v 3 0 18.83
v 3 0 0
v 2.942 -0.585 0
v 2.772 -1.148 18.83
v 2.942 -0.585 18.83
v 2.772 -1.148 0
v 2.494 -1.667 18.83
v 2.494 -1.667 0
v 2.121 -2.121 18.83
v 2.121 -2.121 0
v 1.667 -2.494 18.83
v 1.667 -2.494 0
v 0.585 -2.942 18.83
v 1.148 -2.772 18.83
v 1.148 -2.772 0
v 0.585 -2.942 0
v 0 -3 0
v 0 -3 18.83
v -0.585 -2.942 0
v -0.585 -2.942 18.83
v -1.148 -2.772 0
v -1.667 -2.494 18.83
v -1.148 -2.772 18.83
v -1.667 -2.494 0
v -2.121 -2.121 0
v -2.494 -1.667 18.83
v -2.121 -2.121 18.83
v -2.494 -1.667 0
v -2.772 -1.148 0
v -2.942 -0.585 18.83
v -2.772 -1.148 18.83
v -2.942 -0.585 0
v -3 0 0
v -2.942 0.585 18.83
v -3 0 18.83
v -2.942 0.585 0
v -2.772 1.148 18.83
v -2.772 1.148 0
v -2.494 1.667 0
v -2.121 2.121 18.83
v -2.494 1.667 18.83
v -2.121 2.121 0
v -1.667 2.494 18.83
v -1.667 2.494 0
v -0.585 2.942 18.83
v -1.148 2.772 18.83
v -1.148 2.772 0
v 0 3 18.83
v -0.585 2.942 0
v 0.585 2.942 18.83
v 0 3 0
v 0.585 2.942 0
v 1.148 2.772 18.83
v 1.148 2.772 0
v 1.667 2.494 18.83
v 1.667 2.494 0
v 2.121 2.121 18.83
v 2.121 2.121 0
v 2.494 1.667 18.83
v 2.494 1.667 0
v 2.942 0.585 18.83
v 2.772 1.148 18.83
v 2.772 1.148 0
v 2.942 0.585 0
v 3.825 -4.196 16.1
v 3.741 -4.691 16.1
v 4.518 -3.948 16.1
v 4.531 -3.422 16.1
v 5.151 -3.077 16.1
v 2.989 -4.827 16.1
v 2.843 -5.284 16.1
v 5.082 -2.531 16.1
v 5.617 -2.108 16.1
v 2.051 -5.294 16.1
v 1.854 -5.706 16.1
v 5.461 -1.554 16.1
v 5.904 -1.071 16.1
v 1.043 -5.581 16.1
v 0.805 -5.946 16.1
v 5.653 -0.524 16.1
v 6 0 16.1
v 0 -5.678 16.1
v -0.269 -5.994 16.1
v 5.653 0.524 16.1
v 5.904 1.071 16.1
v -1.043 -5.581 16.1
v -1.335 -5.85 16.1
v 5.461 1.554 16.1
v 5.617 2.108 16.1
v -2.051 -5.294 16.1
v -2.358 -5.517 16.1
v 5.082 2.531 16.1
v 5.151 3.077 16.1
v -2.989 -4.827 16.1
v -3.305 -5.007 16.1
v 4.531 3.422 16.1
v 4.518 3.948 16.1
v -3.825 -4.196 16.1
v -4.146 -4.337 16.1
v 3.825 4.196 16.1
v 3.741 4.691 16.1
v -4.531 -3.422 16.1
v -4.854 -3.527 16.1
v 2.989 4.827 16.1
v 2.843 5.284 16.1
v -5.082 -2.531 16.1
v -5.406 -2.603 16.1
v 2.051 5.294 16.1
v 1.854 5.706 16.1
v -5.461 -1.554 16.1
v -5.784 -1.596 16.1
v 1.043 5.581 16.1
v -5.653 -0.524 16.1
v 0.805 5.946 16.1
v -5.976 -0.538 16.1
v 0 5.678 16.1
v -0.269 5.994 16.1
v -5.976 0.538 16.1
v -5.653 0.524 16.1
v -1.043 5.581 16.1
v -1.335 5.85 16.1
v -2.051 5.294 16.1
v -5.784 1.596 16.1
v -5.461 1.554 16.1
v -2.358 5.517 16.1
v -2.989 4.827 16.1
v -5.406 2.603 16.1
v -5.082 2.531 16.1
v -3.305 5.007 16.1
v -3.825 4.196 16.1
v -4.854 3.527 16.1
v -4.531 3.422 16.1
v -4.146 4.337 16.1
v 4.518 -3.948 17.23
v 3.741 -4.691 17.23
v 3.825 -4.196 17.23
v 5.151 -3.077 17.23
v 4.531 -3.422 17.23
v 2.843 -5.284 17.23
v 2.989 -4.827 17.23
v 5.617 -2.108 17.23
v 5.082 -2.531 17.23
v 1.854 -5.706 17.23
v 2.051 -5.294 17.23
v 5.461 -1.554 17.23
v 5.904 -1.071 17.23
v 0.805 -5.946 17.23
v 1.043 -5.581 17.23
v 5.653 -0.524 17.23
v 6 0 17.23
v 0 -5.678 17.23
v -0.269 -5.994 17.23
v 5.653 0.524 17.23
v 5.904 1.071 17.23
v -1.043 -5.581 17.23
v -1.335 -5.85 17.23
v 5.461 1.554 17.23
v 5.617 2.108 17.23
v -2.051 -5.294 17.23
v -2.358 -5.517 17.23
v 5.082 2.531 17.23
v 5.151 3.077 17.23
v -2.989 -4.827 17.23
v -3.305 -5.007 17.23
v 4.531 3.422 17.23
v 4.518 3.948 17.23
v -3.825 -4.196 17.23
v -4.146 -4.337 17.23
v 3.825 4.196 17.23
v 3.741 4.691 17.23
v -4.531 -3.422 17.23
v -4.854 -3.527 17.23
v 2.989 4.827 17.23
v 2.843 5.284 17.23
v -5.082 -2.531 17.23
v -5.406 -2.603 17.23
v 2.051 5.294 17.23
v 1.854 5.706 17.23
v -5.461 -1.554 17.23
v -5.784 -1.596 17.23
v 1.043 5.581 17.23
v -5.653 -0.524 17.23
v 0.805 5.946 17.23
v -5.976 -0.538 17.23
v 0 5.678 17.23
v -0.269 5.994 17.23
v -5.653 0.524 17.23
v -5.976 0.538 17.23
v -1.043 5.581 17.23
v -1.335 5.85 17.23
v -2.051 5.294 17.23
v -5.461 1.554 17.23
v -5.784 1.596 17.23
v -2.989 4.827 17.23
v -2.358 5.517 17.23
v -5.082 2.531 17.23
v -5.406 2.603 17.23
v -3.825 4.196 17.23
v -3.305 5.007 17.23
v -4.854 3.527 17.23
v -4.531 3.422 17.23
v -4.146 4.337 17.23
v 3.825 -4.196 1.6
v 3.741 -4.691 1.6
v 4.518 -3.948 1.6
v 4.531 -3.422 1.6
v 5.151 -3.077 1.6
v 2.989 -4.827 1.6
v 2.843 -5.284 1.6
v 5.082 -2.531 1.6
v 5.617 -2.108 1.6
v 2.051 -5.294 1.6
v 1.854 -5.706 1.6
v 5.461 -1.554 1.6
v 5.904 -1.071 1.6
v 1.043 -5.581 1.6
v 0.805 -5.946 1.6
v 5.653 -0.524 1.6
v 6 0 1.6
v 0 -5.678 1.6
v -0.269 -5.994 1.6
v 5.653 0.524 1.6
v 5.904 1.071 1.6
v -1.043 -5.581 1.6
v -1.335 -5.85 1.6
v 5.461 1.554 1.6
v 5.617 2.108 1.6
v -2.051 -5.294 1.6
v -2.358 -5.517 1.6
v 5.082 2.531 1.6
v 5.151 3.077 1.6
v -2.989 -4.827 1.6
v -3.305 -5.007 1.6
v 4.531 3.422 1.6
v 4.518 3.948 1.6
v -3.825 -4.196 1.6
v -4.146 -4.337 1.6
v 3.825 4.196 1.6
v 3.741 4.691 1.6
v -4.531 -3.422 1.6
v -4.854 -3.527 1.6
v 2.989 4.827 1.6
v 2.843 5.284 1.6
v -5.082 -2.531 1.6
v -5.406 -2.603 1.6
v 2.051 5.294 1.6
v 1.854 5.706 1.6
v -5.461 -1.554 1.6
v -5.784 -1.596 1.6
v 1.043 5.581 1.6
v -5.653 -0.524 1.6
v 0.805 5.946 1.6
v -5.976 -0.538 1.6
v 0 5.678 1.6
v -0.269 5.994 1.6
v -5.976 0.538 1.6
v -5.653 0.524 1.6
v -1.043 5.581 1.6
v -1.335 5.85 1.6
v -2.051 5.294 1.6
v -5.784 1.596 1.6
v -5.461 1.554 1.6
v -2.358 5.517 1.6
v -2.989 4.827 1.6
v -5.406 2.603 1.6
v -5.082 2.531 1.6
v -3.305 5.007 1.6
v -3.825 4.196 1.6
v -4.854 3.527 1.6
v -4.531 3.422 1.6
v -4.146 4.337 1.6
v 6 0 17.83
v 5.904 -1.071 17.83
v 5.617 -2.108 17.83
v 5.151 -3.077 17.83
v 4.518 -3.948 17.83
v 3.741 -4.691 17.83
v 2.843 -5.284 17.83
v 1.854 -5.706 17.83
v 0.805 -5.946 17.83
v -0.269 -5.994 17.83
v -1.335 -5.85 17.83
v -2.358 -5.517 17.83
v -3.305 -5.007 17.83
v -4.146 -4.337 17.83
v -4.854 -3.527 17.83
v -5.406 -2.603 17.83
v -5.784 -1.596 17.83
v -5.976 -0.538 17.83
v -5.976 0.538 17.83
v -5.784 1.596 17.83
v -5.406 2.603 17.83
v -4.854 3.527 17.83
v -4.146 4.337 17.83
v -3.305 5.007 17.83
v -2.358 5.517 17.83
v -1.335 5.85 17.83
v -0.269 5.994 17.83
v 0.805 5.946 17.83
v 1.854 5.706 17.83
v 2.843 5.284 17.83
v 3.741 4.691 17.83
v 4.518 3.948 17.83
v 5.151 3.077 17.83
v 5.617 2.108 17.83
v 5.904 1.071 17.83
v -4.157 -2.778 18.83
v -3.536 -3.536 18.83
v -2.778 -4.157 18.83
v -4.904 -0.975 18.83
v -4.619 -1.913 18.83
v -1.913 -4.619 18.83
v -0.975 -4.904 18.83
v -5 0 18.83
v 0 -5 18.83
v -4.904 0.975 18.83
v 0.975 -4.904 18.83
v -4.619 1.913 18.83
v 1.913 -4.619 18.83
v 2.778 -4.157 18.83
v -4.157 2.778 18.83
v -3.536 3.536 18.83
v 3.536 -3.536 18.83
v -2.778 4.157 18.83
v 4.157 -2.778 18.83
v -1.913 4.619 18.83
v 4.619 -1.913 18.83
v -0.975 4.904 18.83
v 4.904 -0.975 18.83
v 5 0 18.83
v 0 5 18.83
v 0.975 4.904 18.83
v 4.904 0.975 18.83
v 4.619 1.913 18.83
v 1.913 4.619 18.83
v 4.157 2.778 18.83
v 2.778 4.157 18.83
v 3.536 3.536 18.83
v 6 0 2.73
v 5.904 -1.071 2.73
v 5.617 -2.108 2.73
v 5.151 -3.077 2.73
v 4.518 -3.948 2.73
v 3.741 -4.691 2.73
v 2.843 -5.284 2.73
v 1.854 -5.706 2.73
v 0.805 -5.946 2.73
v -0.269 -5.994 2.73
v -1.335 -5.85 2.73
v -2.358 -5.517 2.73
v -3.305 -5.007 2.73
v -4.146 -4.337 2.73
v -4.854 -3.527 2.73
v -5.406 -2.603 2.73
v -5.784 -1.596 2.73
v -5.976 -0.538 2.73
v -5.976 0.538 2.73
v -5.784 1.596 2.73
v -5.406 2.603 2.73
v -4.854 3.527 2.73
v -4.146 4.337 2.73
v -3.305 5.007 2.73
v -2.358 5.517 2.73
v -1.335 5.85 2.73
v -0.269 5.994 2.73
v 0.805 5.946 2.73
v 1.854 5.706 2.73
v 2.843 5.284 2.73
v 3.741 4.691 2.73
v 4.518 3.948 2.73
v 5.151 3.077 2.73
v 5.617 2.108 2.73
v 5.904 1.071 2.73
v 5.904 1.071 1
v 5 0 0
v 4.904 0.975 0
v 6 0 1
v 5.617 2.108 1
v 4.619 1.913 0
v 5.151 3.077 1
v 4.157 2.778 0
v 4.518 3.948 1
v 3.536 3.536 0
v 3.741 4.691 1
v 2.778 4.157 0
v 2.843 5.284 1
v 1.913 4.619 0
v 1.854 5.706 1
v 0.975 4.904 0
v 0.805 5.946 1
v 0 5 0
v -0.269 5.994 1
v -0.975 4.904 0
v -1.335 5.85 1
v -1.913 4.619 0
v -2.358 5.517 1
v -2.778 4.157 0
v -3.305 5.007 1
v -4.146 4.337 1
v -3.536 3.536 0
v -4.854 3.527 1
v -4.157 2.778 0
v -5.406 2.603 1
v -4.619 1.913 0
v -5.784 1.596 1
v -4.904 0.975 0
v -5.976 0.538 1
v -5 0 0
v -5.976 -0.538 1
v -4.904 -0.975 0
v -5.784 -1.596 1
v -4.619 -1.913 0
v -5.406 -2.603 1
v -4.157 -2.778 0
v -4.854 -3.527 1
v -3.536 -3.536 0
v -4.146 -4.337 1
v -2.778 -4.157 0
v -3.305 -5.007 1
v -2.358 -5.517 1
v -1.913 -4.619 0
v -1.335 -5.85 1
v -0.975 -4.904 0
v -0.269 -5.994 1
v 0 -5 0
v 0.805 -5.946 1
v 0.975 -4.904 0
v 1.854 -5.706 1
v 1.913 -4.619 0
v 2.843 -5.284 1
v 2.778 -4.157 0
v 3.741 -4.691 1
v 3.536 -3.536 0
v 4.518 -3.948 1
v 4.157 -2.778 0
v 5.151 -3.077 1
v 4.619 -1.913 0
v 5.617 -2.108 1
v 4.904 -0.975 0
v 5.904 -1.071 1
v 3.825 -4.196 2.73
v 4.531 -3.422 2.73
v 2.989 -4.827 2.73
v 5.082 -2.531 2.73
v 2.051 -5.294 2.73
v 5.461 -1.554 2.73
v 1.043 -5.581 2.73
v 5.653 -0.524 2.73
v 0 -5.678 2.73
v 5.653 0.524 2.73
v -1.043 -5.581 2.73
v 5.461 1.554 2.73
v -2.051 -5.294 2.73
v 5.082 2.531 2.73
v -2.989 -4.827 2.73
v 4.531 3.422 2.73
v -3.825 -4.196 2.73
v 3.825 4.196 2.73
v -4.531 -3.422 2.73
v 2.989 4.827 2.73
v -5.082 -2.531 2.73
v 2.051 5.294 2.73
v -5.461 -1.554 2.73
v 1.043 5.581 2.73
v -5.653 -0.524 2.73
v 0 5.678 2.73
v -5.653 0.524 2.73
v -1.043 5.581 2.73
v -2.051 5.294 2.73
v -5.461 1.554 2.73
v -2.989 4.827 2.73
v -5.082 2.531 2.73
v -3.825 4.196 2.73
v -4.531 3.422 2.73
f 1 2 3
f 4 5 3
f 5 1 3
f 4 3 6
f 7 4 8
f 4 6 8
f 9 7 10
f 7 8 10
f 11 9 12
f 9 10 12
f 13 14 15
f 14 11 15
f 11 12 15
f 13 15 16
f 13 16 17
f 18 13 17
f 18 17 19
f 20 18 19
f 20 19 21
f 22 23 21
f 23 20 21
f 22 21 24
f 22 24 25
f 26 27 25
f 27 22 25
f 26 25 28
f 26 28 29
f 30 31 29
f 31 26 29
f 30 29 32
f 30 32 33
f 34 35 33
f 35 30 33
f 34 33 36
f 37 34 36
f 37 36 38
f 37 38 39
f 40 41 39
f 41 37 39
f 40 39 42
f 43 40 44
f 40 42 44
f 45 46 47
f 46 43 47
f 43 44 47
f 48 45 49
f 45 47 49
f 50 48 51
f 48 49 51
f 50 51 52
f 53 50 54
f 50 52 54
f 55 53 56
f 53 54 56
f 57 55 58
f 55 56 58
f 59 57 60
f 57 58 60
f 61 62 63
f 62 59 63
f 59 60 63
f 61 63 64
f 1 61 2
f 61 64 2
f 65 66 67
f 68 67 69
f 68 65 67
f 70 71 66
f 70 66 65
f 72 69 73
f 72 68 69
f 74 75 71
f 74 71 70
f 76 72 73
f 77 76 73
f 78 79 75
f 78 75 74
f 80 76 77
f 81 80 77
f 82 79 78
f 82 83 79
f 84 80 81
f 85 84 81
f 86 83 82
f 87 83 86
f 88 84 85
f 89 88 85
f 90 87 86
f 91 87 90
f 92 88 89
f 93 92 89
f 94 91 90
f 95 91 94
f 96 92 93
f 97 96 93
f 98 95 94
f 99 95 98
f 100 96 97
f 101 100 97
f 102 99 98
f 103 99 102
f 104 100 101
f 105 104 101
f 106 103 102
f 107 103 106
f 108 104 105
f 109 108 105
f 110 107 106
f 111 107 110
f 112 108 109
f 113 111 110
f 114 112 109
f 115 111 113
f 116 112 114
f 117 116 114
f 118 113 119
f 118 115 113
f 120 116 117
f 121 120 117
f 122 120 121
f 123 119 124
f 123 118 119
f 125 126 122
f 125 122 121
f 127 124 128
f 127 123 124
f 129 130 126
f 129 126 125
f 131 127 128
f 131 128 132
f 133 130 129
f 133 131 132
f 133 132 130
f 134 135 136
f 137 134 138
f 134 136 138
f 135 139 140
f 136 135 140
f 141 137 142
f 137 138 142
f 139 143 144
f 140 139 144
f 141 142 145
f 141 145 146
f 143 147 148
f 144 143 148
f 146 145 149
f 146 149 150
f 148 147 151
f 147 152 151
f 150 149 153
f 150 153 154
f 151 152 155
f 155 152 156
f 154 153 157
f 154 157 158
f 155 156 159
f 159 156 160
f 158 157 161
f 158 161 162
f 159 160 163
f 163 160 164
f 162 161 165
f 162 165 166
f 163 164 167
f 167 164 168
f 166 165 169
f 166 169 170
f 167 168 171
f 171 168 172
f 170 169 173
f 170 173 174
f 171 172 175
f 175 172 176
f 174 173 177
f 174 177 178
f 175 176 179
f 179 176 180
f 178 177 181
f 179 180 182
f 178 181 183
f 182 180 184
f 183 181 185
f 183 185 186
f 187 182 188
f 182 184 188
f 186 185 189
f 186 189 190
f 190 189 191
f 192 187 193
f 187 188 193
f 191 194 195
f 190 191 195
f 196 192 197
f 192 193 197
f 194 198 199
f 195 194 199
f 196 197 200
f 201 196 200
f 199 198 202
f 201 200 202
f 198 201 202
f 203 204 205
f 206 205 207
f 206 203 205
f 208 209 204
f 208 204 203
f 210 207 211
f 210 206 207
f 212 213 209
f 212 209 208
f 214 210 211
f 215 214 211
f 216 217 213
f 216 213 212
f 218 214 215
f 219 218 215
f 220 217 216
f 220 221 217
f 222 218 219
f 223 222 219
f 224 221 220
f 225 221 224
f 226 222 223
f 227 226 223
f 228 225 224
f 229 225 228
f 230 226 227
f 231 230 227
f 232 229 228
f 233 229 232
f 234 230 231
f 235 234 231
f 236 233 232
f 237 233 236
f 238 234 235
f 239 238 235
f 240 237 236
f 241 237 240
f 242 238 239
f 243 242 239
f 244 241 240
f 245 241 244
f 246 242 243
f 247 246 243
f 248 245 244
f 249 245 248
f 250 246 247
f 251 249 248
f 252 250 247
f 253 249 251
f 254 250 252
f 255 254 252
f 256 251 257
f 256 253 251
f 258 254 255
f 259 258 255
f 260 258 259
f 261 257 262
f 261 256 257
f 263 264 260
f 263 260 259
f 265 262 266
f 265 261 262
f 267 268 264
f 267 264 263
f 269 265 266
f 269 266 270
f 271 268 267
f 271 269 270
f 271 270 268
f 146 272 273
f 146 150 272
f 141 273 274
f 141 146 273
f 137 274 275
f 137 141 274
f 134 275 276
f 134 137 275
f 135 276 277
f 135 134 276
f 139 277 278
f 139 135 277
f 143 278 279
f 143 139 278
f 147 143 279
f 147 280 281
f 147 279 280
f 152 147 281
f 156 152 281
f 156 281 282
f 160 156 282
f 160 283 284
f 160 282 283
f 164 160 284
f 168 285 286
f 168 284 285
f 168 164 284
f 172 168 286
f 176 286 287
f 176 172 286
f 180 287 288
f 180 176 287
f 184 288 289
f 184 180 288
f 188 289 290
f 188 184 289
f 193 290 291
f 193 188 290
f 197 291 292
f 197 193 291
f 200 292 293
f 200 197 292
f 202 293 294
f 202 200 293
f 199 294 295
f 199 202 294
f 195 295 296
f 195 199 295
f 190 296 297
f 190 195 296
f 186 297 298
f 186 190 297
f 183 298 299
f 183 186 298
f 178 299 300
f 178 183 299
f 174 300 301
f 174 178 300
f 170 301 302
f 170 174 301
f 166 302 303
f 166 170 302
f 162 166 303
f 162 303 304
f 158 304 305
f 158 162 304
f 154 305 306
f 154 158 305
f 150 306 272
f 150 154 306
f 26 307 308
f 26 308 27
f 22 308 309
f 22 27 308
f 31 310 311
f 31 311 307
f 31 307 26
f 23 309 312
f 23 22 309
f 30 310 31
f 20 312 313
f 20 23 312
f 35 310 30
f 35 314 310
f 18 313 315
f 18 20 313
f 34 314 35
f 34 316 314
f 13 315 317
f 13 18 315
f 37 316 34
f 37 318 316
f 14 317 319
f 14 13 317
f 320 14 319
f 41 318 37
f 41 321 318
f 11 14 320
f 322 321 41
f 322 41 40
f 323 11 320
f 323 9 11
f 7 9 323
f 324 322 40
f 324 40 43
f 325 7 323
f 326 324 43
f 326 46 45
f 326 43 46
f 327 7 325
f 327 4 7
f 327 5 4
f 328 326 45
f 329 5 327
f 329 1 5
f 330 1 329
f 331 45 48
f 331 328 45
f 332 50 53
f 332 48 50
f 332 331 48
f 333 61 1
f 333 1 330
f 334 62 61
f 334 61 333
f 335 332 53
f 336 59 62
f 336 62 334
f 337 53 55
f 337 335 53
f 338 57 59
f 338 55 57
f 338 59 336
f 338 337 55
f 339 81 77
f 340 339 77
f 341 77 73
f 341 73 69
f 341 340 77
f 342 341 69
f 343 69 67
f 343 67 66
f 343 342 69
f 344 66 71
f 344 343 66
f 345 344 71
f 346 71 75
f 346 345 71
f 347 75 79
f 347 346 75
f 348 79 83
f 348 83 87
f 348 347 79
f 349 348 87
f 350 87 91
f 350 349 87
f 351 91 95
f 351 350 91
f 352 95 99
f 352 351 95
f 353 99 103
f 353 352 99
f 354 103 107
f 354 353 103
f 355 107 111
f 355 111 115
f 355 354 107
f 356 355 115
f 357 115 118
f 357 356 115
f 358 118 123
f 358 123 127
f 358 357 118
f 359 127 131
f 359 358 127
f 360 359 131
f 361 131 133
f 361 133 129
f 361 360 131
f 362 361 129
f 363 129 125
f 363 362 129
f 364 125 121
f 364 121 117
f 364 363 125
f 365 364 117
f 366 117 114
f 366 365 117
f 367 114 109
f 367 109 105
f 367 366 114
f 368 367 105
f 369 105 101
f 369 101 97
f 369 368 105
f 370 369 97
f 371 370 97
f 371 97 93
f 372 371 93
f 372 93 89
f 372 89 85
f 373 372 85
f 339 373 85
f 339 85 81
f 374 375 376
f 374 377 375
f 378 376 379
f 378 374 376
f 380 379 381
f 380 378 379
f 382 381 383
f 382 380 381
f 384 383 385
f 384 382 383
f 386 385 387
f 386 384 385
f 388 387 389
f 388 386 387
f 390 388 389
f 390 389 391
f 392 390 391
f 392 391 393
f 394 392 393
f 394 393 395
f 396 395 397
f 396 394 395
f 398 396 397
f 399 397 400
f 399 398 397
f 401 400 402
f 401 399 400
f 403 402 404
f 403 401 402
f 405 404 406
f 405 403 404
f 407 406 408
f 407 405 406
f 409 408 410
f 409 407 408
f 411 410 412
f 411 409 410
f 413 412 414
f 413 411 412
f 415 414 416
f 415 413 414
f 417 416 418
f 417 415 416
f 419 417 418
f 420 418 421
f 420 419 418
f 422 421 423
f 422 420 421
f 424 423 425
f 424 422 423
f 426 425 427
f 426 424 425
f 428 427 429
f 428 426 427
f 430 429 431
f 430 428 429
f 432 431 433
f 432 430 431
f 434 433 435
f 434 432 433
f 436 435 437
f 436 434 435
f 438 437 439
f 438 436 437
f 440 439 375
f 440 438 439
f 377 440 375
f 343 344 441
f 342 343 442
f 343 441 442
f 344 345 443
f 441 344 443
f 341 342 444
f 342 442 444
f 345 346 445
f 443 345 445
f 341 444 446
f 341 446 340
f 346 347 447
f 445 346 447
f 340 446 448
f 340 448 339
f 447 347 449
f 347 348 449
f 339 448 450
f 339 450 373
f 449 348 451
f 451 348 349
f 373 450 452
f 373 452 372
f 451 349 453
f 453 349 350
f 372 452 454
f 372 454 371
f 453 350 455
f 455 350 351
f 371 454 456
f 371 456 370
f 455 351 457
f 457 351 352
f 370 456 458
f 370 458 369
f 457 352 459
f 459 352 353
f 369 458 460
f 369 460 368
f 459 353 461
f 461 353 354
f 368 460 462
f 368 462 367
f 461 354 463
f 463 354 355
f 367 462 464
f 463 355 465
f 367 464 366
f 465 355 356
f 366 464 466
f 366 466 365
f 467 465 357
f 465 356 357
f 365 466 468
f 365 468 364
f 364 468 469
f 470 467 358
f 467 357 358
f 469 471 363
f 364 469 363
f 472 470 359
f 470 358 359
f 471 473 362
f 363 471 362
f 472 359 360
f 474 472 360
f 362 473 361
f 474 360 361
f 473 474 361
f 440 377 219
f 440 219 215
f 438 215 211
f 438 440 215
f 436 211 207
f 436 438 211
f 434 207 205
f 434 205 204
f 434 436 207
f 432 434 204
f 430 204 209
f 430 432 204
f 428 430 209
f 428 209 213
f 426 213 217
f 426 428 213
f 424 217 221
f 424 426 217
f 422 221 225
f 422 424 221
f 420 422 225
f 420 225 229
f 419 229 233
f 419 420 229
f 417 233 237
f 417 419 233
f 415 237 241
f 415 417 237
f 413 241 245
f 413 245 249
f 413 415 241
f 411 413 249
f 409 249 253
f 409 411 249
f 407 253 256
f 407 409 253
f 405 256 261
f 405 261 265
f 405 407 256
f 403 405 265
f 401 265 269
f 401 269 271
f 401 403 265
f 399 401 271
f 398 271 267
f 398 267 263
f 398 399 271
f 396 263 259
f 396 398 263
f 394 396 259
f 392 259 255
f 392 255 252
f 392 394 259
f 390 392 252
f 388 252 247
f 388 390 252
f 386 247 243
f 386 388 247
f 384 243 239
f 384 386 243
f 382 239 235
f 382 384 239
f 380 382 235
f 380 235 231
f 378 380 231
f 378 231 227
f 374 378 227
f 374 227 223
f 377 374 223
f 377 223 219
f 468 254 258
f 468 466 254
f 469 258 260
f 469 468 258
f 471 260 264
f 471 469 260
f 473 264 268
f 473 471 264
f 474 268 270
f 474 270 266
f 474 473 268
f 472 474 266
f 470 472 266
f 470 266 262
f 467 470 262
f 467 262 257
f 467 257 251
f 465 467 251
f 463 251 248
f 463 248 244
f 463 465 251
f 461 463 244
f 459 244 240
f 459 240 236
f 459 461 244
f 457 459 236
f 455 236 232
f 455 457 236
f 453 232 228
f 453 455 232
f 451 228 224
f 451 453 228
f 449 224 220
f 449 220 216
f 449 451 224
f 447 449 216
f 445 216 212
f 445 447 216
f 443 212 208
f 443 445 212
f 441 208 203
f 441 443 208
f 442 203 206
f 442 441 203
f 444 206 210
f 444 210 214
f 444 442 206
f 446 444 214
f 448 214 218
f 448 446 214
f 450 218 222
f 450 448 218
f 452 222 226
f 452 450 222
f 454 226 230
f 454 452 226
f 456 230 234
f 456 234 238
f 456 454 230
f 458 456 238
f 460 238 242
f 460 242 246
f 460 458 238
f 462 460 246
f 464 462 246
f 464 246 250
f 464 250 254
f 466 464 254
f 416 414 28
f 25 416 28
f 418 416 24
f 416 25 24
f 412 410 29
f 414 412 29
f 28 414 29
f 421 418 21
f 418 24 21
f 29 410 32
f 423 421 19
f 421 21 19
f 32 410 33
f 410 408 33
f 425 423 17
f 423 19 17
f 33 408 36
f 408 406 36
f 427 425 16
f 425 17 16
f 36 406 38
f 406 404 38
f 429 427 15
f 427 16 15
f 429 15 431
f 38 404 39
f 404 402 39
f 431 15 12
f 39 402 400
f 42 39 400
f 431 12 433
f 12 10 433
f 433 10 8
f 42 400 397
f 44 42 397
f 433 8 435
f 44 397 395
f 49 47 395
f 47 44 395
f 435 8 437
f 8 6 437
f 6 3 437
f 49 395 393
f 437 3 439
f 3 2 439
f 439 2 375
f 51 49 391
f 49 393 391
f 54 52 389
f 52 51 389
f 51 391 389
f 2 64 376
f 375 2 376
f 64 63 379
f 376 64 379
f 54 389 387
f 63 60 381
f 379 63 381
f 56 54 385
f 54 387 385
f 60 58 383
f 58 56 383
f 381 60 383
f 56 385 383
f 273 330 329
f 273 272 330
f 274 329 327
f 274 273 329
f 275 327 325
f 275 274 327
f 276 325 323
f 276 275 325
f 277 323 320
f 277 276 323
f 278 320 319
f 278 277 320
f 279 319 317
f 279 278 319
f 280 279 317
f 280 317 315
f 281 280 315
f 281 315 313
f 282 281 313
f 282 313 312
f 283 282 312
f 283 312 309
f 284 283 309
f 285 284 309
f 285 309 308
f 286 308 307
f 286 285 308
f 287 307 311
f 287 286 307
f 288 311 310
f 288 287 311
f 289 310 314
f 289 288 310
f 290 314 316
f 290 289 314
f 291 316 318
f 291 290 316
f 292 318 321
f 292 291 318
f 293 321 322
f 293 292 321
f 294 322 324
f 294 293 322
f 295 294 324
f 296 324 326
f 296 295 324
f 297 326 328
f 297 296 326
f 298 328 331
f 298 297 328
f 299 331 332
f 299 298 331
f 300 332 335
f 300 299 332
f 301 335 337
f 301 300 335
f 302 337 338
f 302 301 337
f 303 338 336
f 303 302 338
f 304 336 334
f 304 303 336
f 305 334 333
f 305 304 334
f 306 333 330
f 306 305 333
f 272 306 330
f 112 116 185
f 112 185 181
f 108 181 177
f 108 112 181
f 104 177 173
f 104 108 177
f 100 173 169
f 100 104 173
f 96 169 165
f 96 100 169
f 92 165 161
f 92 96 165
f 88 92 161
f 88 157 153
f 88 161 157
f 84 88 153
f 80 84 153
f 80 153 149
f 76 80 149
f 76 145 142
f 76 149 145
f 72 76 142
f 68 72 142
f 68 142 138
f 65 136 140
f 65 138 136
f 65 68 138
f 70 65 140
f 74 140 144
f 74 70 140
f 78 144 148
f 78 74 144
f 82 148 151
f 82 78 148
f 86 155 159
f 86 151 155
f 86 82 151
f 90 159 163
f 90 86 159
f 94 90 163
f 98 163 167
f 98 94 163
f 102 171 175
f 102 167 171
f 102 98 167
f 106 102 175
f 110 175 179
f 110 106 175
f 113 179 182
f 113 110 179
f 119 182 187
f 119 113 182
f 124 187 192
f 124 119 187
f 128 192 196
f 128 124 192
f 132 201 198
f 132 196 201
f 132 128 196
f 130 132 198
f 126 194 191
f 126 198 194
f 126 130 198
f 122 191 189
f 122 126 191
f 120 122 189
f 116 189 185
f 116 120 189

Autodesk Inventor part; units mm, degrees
ref_plane "YZ Plane" through (0, 0, 0) normal (1, 0, 0) x (0, 1, 0)
ref_plane "XZ Plane" through (0, 0, 0) normal (0, 1, 0) x (-1, 0, 0)
ref_plane "XY Plane" through (0, 0, 0) normal (0, 0, 1) x (1, 0, 0)
sketch "Sketch1" plane through (0, 0, 0) normal (0, 0, 1) x (1, 0, 0)
  circle A0 centre (0, 0) radius 3
  circle A1 centre (0, 0) radius 6
  dimension "d0" = 6
  dimension "d1" = 12
extrude "Extrusion1" add sketch "Sketch1" along normal blind 18.83
chamfer "Chamfer1" distance 1 angle 45 2 edges at (-6, 0, 18.83) (-6, 0, 0)
sketch "Sketch2" plane through (0, 0, 0) normal (1, 0, 0) x (0, 1, 0)
  line L0 (6.8077, 17.23) -> (5.6777, 17.23)
  line L1 (5.6777, 17.23) -> (5.6777, 16.1)
  line L2 (5.6777, 16.1) -> (6.8077, 16.1)
  line L3 (6.8077, 16.1) -> (6.8077, 17.23)
  line L4 (-5, 18.83) -> (5, 18.83) projected
  line L5 (6.8077, 1.6) -> (5.6777, 1.6)
  line L6 (5.6777, 1.6) -> (5.6777, 2.73)
  line L7 (5.6777, 2.73) -> (6.8077, 2.73)
  line L8 (6.8077, 2.73) -> (6.8077, 1.6)
  line L9 (5, 0) -> (-5, 0) projected
  line L10 (0, -3.766) -> (0, 22.596) projected
  point P0 (0, 0)
  dimension "d7" = 1.13
  dimension "d8" = 1.13
  dimension "d9" = 1.6
  dimension "d10" = 1.13
  dimension "d11" = 1.13
  dimension "d12" = 1.6
revolve "Revolution1" cut sketch "Sketch2" angle 360 about axis through (0, 0, -10) along (0, 0, 1)
properties part number "00_Igus_Drylin_6mm"
